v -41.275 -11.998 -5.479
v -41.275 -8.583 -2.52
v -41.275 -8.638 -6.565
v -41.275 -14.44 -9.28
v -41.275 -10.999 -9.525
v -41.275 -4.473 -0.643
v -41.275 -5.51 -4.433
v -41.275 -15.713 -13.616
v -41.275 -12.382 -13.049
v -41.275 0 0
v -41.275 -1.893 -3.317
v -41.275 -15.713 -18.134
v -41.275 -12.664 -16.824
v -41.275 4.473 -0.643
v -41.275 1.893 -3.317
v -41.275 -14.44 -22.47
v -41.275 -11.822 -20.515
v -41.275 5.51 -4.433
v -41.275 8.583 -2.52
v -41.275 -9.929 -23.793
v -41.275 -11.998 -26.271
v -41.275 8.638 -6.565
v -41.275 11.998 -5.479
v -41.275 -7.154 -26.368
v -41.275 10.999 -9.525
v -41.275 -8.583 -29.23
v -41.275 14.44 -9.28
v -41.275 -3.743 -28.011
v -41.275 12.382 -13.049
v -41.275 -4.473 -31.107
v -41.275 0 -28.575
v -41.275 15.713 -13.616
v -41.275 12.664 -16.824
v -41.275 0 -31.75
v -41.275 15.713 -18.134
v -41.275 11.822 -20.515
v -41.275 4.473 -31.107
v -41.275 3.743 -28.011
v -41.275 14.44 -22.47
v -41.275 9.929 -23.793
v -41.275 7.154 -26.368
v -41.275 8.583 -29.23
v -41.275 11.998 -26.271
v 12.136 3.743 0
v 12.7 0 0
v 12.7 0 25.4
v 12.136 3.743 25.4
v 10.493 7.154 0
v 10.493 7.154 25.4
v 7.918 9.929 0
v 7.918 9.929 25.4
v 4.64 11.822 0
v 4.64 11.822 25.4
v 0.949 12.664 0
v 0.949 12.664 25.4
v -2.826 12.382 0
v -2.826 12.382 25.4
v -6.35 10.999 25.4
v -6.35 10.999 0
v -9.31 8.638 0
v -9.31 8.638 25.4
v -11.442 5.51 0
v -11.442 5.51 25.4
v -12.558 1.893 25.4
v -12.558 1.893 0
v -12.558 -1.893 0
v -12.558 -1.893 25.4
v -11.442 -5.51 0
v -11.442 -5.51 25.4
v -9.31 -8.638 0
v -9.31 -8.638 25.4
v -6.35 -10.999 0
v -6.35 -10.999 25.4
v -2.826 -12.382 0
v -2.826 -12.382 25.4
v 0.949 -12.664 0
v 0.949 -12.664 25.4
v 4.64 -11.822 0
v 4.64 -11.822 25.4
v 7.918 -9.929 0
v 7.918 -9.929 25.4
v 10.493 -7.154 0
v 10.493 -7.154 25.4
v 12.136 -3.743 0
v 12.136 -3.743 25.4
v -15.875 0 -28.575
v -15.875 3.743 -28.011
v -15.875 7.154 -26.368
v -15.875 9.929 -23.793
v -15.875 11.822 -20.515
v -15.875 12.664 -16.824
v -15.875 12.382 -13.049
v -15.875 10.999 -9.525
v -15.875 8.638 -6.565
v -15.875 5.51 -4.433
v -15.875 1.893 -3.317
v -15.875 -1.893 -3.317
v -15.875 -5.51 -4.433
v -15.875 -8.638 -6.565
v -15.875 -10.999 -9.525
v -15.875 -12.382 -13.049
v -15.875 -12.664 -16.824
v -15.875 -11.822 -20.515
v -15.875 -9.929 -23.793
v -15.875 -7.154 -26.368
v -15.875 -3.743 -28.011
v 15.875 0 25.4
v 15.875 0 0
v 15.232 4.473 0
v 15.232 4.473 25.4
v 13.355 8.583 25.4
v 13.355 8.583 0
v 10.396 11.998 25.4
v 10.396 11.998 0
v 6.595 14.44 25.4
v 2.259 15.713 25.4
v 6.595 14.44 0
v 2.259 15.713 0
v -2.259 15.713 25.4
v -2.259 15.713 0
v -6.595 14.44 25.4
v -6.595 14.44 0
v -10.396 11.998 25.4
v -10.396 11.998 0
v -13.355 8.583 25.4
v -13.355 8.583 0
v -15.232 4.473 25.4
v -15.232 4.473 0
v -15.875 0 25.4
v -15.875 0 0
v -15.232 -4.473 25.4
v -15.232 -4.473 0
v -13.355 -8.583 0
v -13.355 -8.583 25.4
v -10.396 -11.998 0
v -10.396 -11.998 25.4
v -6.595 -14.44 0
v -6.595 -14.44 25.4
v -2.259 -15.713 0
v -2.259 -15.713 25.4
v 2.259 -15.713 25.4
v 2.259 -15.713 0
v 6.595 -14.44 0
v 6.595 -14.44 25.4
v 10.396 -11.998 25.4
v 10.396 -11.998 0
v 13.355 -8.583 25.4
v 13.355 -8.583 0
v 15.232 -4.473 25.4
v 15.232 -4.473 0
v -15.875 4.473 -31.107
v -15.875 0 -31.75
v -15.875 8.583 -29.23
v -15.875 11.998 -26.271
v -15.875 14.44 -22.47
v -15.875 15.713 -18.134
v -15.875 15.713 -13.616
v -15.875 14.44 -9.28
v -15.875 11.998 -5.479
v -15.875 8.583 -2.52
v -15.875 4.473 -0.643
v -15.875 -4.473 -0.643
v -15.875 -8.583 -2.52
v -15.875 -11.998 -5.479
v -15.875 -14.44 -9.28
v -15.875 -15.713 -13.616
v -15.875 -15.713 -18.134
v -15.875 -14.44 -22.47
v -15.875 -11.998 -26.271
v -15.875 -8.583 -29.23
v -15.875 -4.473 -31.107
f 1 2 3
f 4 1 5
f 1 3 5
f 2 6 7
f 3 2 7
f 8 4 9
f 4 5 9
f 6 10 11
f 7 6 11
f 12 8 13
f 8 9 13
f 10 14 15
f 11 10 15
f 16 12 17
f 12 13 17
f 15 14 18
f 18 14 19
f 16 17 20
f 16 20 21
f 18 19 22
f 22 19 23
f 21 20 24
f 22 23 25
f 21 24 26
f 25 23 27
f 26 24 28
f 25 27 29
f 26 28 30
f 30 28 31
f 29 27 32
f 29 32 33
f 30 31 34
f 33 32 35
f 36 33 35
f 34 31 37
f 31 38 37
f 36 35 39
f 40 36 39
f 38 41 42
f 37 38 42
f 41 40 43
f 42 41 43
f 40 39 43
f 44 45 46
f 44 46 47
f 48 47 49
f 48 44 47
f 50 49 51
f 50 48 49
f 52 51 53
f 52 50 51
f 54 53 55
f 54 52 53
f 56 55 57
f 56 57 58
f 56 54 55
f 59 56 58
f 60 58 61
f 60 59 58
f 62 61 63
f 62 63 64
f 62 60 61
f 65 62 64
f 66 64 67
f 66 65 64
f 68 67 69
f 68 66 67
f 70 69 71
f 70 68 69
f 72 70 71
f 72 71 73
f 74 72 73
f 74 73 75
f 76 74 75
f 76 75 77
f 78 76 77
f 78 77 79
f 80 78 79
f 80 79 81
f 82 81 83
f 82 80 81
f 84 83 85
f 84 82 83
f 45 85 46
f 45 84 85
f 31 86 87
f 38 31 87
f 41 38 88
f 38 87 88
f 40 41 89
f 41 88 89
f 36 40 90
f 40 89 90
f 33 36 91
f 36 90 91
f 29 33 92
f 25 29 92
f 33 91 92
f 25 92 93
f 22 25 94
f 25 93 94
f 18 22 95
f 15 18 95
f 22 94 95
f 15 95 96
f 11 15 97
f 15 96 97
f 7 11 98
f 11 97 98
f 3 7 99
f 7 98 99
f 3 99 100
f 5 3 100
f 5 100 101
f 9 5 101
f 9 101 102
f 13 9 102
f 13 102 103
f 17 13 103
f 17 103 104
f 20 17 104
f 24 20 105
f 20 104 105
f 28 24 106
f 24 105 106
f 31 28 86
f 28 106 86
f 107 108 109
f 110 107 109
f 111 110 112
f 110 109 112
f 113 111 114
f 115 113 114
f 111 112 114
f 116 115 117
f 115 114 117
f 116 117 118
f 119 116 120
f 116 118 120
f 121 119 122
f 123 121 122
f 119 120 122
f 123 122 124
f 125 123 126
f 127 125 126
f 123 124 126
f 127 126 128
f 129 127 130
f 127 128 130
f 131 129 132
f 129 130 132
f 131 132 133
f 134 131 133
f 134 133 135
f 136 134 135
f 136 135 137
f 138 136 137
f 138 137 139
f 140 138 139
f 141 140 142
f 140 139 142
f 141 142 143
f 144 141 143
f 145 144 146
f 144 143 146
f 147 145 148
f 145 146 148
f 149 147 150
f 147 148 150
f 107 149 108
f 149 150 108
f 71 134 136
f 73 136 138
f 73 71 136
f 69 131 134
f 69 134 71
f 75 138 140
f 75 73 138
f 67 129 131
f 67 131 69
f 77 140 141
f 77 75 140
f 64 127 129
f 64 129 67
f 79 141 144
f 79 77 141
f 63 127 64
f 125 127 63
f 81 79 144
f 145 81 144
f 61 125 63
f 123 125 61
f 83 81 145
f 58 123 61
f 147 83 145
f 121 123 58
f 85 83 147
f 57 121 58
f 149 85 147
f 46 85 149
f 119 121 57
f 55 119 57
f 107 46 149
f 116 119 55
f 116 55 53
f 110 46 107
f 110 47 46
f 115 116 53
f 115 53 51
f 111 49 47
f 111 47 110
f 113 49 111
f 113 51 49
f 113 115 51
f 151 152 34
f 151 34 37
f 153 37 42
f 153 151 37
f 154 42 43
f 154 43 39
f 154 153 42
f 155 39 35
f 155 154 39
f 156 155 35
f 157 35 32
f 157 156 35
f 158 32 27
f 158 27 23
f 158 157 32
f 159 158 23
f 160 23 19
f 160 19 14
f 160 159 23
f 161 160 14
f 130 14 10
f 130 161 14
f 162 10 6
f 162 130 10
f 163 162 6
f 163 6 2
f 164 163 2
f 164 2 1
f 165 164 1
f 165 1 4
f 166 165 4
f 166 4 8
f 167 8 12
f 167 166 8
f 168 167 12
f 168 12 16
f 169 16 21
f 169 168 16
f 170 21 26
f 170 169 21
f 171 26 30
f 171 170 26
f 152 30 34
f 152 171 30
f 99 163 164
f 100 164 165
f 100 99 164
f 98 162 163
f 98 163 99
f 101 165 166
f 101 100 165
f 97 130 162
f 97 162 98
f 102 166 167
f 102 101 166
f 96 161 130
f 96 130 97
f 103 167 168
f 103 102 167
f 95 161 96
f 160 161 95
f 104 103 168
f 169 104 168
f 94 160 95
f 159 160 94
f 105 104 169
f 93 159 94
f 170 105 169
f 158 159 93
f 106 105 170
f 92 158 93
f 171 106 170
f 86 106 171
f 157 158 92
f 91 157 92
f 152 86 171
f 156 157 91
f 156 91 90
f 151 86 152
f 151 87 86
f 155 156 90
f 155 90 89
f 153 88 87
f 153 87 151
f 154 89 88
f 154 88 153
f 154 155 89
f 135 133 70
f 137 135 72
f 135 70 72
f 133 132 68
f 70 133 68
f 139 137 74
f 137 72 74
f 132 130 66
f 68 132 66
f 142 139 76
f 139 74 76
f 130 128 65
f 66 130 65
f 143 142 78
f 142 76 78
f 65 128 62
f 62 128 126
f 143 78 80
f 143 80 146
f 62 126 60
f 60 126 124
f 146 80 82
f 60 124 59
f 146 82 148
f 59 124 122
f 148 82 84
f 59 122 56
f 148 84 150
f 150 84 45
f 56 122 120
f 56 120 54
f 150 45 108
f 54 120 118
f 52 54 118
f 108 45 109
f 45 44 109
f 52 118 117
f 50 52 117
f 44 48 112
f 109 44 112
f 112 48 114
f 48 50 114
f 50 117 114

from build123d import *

# Parameters (mm, degrees)
SKETCH1_R           = 15.875
SKETCH1_R_2         = 12.7
BOSS_EXTRUDE1_DEPTH = 25.4
SKETCH5_R           = 15.875
SKETCH5_R_2         = 12.7
BOSS_EXTRUDE2_DEPTH = 25.4


with BuildPart() as part:
    # Sketch1 → Boss-Extrude1 (new body)
    with BuildSketch(Plane.XY):
        Circle(SKETCH1_R)
        Circle(SKETCH1_R_2, mode=Mode.SUBTRACT)
    extrude(amount=BOSS_EXTRUDE1_DEPTH)


with BuildPart() as body_2:
    # Sketch5 → Boss-Extrude2 (new body)
    with BuildSketch(Plane(origin=(-15.875, 0, 0), x_dir=(0, 0, -1), z_dir=(1, 0, 0))):
        with Locations((15.875, 0)):
            Circle(SKETCH5_R)
        with Locations((15.875, 0)):
            Circle(SKETCH5_R_2, mode=Mode.SUBTRACT)
    extrude(amount=-BOSS_EXTRUDE2_DEPTH)


solid = Compound([part.part, body_2.part])
